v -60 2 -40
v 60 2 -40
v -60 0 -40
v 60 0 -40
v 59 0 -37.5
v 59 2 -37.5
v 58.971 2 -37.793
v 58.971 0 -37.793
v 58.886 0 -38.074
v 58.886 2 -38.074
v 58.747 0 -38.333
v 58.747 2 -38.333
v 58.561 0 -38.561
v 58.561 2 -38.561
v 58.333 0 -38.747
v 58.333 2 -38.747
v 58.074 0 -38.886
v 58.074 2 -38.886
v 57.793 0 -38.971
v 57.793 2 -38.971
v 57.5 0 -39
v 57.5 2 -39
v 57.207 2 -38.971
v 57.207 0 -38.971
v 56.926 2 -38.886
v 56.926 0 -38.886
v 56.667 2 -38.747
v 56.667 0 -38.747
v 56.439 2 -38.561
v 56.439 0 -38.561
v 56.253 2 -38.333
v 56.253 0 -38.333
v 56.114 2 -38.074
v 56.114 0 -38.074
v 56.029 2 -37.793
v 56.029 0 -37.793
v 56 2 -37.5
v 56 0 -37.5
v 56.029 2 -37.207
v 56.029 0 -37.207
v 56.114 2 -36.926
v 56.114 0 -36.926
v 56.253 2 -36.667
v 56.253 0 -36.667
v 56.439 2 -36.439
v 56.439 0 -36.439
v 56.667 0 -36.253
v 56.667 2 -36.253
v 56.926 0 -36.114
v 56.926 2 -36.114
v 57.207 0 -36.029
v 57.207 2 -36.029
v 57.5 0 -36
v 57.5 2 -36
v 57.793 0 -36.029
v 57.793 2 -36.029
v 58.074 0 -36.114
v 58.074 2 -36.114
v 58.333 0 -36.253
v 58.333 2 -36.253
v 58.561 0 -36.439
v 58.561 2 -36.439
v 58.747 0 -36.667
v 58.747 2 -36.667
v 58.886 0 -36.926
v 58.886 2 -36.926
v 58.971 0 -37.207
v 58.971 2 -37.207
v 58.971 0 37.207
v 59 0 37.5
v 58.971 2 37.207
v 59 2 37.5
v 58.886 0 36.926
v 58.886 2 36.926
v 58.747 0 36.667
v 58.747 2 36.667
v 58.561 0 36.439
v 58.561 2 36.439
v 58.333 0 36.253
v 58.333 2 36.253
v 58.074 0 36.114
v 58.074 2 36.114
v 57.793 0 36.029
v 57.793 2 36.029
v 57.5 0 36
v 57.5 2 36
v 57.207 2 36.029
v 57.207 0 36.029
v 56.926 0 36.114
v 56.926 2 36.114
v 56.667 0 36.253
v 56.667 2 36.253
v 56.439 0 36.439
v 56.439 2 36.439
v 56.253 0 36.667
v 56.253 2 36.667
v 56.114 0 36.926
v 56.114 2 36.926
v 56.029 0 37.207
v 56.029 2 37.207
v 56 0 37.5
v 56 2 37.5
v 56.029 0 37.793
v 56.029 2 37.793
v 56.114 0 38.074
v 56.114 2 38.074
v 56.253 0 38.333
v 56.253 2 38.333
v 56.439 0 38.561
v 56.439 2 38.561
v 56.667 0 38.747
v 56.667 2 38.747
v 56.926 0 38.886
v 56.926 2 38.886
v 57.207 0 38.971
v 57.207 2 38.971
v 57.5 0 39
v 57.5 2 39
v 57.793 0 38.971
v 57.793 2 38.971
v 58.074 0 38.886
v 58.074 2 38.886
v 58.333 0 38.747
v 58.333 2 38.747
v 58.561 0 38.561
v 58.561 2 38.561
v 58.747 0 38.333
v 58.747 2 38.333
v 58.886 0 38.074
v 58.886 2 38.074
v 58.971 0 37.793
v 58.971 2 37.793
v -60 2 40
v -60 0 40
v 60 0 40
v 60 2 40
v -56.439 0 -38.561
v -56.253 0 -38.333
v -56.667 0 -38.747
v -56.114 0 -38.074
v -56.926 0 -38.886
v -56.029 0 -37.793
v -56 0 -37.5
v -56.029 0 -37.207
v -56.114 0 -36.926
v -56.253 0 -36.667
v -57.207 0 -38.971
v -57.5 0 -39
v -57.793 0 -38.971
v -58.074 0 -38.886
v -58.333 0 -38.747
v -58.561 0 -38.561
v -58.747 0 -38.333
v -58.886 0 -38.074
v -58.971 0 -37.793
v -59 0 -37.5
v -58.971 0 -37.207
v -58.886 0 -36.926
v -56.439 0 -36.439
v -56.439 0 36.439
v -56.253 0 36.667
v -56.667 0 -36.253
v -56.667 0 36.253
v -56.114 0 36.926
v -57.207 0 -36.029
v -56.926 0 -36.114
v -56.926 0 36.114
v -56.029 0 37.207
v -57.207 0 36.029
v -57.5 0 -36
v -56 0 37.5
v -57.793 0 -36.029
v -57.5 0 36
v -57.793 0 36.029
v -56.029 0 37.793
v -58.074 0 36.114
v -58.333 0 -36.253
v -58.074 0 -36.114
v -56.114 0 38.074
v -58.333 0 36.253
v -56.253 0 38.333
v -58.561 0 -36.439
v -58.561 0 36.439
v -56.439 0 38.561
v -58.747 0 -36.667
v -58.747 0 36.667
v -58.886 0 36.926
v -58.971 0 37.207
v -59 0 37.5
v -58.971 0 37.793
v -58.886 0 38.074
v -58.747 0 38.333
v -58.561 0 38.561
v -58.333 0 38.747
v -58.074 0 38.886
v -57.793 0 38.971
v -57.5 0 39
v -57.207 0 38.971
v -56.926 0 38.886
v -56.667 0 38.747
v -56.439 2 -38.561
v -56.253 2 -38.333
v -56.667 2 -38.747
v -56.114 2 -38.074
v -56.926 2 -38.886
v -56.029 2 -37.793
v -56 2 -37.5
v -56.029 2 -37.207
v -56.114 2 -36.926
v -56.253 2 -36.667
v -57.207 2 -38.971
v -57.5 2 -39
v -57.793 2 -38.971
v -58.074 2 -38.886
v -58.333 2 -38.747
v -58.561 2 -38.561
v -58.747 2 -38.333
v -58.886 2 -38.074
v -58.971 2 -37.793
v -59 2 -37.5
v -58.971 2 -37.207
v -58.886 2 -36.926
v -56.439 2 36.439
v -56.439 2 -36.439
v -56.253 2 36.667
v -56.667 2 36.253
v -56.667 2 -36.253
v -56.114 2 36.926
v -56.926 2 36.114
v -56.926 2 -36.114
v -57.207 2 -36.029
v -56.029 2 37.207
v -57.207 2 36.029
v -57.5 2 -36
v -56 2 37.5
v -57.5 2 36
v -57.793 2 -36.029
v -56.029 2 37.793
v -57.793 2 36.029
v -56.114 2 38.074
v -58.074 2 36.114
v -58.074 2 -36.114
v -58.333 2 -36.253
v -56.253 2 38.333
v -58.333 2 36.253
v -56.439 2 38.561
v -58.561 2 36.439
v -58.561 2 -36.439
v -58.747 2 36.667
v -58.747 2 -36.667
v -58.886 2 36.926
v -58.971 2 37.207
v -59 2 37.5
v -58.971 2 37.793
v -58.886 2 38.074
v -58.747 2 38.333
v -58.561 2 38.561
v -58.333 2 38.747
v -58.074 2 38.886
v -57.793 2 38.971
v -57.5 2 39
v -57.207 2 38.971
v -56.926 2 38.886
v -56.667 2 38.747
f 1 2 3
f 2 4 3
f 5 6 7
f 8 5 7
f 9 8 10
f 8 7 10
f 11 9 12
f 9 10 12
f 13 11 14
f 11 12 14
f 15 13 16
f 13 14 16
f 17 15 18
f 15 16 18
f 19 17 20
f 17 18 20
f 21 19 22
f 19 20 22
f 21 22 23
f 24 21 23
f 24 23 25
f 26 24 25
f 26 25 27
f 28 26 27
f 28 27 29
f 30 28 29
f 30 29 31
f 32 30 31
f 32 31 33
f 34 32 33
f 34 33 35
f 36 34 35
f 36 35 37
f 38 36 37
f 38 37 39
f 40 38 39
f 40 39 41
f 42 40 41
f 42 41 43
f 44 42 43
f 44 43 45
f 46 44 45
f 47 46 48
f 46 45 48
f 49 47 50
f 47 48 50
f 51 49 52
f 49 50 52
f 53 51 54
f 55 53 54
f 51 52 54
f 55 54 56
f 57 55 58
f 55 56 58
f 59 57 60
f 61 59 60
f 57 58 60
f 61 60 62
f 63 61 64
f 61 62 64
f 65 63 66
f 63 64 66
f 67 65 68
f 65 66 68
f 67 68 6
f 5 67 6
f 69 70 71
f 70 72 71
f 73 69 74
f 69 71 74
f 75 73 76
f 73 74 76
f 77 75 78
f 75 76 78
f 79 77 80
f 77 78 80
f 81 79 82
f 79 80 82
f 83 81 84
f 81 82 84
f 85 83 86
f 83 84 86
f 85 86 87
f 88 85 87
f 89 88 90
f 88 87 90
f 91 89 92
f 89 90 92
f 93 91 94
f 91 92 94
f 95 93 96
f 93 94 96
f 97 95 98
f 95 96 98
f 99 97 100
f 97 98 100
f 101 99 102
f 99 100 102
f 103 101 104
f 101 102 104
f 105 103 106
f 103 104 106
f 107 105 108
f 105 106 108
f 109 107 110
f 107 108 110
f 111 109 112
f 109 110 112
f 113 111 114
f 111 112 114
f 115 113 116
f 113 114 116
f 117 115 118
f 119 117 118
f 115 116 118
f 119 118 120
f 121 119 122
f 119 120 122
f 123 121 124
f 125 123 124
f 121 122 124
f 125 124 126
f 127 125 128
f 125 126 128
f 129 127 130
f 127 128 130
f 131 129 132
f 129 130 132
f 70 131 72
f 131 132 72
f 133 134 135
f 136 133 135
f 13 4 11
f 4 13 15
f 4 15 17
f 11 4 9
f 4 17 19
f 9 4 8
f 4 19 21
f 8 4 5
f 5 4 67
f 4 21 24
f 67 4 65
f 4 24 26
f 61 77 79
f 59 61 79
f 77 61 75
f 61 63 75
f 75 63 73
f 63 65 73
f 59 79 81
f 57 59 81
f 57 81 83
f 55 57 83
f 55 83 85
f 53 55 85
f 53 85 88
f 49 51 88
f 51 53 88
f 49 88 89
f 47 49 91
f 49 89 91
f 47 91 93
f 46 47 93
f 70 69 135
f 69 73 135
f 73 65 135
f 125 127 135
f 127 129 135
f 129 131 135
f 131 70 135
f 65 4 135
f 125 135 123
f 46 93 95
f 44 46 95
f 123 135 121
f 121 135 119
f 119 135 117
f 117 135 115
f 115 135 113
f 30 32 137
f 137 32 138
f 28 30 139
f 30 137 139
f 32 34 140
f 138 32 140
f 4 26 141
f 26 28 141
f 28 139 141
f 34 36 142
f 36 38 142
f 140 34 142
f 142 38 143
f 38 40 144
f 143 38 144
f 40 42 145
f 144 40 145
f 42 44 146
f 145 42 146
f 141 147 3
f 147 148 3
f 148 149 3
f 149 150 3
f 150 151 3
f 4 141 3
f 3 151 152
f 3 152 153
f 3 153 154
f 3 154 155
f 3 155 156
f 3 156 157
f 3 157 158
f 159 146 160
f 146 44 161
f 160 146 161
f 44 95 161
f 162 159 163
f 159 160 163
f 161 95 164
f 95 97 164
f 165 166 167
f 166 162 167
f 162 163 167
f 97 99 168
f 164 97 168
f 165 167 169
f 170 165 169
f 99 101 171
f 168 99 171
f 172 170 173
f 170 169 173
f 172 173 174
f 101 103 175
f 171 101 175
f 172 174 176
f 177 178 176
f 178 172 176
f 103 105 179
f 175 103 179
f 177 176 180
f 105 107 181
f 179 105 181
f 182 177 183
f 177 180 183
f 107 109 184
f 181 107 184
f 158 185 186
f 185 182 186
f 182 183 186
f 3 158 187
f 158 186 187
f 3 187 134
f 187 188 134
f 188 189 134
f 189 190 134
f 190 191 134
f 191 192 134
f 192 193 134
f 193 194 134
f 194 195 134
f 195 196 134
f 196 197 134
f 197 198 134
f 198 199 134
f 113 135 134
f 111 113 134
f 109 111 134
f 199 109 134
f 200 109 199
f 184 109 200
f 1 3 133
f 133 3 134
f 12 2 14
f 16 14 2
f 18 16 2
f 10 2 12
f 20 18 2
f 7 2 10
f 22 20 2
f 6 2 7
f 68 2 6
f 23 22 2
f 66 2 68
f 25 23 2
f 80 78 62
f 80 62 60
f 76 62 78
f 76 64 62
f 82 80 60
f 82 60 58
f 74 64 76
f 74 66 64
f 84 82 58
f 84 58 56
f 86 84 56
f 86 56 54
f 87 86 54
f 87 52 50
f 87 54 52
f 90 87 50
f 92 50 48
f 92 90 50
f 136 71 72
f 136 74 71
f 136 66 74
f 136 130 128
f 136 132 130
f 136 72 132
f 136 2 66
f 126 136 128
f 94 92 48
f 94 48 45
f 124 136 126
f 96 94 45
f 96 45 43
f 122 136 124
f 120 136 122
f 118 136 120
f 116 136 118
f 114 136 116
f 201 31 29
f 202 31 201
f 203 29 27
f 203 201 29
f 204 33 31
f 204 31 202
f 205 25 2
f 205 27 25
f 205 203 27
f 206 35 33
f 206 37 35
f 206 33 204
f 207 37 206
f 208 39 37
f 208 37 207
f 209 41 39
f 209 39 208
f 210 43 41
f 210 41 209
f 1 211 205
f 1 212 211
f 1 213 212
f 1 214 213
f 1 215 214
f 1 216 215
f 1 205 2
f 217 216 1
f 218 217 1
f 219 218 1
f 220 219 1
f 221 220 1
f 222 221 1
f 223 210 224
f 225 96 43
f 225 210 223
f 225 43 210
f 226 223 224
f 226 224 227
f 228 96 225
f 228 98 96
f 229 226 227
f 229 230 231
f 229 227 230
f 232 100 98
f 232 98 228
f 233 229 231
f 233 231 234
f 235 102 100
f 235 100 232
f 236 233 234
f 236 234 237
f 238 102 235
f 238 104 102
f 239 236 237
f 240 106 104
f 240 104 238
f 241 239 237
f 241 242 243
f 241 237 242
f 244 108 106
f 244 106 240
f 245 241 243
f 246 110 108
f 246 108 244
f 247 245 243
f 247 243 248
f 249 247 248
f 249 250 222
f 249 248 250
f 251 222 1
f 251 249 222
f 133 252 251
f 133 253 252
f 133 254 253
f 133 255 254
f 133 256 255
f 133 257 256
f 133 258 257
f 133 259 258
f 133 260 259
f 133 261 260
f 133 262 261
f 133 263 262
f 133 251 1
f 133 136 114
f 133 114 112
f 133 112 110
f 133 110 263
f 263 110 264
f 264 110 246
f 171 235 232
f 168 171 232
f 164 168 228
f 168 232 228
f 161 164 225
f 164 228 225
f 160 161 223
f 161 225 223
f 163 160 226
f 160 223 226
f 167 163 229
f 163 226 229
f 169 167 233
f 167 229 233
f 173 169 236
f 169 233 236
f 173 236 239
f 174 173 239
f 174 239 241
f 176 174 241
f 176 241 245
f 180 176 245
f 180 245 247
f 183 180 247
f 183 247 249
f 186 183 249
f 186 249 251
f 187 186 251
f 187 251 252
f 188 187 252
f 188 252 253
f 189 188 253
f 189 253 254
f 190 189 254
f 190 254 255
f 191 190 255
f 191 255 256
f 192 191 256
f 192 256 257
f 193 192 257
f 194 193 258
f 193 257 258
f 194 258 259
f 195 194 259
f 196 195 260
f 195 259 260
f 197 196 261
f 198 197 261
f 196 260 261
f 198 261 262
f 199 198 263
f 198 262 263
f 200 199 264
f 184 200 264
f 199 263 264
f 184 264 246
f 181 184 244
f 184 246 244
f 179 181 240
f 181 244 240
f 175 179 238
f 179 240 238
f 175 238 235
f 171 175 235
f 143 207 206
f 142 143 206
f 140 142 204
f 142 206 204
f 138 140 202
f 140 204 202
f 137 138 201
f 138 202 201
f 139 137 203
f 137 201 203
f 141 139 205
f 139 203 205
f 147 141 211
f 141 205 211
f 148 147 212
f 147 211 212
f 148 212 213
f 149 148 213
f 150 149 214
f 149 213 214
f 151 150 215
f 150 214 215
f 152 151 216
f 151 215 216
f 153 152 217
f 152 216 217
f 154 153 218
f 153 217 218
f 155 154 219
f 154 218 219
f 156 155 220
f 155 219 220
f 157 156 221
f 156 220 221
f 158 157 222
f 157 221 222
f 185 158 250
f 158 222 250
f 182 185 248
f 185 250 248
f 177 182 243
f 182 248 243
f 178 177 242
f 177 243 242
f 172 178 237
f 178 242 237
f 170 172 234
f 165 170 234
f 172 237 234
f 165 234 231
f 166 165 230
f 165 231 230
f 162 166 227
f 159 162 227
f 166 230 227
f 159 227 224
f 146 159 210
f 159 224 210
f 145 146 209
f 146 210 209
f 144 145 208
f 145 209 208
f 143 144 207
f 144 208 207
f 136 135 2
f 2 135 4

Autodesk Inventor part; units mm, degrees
sketch "Эскиз1" plane through (0, 0, 0) normal (0, 1, 0) x (-1, 0, 0)
  line L0 (60, 40) -> (-60, 40)
  line L1 (-60, 40) -> (-60, -40)
  line L2 (-60, -40) -> (60, -40)
  line L3 (60, -40) -> (60, 40)
  line L4 (60, 40) -> (-60, -40) construction
  line L5 (-60, 40) -> (60, -40) construction
  point P0 (0, 0)
  dimension "d0" = 120
  dimension "d1" = 80
extrude "Выдавливание1" add sketch "Эскиз1" along normal blind 2
sketch "Эскиз2" plane through (0, 2, 0) normal (0, 1, 0) x (1, 0, 0)
  circle A0 centre (-57.5, 37.5) radius 1.5
  line L0 (-60, 40) -> (-60, -40) projected
  line L1 (60, 40) -> (-60, 40) projected
  line L2 (0, 56) -> (0, -56) construction
  line L3 (84, 0) -> (-84, 0) construction
  circle A1 centre (57.5, 37.5) radius 1.5
  circle A2 centre (-57.5, -37.5) radius 1.5
  circle A3 centre (57.5, -37.5) radius 1.5
  dimension "d4" = 3
  dimension "d5" = 2.5
  dimension "d6" = 2.5
extrude "Выдавливание2" cut sketch "Эскиз2" against normal up to next
properties part number "Плата"
